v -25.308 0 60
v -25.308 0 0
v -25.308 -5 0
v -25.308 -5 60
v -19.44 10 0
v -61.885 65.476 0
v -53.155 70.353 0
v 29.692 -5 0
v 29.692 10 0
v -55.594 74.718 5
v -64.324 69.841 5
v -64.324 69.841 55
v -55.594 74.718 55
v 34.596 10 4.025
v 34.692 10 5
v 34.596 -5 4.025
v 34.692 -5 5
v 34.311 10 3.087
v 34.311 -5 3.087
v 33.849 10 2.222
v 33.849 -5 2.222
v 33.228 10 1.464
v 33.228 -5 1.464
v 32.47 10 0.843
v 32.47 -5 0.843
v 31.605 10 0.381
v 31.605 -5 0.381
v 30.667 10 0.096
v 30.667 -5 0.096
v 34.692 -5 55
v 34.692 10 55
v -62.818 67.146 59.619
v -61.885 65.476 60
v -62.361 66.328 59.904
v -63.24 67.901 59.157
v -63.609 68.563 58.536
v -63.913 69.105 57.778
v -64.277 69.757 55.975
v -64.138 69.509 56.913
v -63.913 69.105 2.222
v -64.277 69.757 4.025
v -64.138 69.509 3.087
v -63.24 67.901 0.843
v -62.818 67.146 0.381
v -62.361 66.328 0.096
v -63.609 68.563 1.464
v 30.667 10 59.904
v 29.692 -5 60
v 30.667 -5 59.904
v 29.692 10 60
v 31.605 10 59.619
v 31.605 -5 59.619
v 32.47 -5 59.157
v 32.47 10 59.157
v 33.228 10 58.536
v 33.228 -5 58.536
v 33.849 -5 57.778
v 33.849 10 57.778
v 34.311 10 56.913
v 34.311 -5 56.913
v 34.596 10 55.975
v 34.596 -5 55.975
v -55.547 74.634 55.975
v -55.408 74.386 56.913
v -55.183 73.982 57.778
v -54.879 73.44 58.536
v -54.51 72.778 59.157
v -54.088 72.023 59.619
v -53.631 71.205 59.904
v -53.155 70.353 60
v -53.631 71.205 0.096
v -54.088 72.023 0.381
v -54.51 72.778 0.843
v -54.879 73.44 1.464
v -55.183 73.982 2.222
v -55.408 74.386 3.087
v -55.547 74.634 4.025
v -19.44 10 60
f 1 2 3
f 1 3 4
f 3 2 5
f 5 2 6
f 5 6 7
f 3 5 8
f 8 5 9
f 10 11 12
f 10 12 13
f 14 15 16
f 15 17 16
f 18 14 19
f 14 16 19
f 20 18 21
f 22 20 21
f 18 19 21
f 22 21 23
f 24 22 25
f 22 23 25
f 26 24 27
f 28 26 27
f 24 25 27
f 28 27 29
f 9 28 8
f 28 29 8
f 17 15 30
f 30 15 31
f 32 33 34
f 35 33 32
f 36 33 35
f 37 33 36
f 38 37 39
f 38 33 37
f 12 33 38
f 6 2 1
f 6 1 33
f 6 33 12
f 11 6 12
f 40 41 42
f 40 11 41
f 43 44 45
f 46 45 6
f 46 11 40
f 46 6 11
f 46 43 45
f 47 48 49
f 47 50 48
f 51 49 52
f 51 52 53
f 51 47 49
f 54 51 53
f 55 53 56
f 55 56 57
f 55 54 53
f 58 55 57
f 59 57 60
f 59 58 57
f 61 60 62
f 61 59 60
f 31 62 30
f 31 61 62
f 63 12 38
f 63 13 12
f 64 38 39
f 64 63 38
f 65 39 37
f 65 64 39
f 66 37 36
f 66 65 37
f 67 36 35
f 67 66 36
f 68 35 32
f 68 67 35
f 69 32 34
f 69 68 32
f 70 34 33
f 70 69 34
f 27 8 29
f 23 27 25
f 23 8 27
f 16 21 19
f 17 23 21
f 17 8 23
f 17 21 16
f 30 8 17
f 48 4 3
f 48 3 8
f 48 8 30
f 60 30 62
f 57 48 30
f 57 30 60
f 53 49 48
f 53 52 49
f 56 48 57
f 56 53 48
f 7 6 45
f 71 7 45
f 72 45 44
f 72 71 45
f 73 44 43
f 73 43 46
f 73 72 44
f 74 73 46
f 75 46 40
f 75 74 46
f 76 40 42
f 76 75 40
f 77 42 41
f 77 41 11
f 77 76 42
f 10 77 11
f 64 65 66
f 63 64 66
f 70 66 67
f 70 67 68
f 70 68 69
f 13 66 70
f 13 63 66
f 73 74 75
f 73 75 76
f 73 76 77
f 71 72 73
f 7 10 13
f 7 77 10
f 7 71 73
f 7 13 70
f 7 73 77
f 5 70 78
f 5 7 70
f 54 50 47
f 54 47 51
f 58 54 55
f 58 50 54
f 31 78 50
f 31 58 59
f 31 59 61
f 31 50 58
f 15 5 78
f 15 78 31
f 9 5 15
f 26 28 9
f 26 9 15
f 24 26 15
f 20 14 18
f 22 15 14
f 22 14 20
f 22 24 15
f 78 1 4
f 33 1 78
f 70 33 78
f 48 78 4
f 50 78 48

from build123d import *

# Parameters (mm, degrees)
EXTRUDE_THIN2_DEPTH = 60
SKETCH2_W           = 60
SKETCH2_H           = 60
BOSS_EXTRUDE1_DEPTH = 5
FILLET5_R           = 5
FILLET6_R           = 5
FILLET7_R           = 5
FILLET8_R           = 5


with BuildPart() as part:
    # Sketch1 → Extrude-Thin2 (new body)
    with BuildSketch(Plane.XY):
        Polygon((34.692024717, 0), (-25.307975283, 0), (-64.323670762, 69.841073204), (-55.593536612, 74.718035139), (-19.439751523, 10), (34.692024717, 10), align=None)
    extrude(amount=EXTRUDE_THIN2_DEPTH)

    # Sketch2 → Boss-Extrude1 (add)
    with BuildSketch(Plane.XZ):
        with Locations((4.692024717, 30)):
            Rectangle(SKETCH2_W, SKETCH2_H)
    extrude(amount=BOSS_EXTRUDE1_DEPTH)

    # Fillet5
    fillet5_edges = [part.edges().sort_by_distance(p)[0] for p in [
        (-59.958603687, 72.279554172, 60),
    ]]
    fillet(fillet5_edges, radius=FILLET5_R)

    # Fillet6
    fillet6_edges = [part.edges().sort_by_distance(p)[0] for p in [
        (34.692024717, 2.5, 60),
    ]]
    fillet(fillet6_edges, radius=FILLET6_R)

    # Fillet7
    fillet7_edges = [part.edges().sort_by_distance(p)[0] for p in [
        (34.692024717, 2.5, 0),
    ]]
    fillet(fillet7_edges, radius=FILLET7_R)

    # Fillet8
    fillet8_edges = [part.edges().sort_by_distance(p)[0] for p in [
        (-59.958603687, 72.279554172, 0),
    ]]
    fillet(fillet8_edges, radius=FILLET8_R)


solid = part.part
